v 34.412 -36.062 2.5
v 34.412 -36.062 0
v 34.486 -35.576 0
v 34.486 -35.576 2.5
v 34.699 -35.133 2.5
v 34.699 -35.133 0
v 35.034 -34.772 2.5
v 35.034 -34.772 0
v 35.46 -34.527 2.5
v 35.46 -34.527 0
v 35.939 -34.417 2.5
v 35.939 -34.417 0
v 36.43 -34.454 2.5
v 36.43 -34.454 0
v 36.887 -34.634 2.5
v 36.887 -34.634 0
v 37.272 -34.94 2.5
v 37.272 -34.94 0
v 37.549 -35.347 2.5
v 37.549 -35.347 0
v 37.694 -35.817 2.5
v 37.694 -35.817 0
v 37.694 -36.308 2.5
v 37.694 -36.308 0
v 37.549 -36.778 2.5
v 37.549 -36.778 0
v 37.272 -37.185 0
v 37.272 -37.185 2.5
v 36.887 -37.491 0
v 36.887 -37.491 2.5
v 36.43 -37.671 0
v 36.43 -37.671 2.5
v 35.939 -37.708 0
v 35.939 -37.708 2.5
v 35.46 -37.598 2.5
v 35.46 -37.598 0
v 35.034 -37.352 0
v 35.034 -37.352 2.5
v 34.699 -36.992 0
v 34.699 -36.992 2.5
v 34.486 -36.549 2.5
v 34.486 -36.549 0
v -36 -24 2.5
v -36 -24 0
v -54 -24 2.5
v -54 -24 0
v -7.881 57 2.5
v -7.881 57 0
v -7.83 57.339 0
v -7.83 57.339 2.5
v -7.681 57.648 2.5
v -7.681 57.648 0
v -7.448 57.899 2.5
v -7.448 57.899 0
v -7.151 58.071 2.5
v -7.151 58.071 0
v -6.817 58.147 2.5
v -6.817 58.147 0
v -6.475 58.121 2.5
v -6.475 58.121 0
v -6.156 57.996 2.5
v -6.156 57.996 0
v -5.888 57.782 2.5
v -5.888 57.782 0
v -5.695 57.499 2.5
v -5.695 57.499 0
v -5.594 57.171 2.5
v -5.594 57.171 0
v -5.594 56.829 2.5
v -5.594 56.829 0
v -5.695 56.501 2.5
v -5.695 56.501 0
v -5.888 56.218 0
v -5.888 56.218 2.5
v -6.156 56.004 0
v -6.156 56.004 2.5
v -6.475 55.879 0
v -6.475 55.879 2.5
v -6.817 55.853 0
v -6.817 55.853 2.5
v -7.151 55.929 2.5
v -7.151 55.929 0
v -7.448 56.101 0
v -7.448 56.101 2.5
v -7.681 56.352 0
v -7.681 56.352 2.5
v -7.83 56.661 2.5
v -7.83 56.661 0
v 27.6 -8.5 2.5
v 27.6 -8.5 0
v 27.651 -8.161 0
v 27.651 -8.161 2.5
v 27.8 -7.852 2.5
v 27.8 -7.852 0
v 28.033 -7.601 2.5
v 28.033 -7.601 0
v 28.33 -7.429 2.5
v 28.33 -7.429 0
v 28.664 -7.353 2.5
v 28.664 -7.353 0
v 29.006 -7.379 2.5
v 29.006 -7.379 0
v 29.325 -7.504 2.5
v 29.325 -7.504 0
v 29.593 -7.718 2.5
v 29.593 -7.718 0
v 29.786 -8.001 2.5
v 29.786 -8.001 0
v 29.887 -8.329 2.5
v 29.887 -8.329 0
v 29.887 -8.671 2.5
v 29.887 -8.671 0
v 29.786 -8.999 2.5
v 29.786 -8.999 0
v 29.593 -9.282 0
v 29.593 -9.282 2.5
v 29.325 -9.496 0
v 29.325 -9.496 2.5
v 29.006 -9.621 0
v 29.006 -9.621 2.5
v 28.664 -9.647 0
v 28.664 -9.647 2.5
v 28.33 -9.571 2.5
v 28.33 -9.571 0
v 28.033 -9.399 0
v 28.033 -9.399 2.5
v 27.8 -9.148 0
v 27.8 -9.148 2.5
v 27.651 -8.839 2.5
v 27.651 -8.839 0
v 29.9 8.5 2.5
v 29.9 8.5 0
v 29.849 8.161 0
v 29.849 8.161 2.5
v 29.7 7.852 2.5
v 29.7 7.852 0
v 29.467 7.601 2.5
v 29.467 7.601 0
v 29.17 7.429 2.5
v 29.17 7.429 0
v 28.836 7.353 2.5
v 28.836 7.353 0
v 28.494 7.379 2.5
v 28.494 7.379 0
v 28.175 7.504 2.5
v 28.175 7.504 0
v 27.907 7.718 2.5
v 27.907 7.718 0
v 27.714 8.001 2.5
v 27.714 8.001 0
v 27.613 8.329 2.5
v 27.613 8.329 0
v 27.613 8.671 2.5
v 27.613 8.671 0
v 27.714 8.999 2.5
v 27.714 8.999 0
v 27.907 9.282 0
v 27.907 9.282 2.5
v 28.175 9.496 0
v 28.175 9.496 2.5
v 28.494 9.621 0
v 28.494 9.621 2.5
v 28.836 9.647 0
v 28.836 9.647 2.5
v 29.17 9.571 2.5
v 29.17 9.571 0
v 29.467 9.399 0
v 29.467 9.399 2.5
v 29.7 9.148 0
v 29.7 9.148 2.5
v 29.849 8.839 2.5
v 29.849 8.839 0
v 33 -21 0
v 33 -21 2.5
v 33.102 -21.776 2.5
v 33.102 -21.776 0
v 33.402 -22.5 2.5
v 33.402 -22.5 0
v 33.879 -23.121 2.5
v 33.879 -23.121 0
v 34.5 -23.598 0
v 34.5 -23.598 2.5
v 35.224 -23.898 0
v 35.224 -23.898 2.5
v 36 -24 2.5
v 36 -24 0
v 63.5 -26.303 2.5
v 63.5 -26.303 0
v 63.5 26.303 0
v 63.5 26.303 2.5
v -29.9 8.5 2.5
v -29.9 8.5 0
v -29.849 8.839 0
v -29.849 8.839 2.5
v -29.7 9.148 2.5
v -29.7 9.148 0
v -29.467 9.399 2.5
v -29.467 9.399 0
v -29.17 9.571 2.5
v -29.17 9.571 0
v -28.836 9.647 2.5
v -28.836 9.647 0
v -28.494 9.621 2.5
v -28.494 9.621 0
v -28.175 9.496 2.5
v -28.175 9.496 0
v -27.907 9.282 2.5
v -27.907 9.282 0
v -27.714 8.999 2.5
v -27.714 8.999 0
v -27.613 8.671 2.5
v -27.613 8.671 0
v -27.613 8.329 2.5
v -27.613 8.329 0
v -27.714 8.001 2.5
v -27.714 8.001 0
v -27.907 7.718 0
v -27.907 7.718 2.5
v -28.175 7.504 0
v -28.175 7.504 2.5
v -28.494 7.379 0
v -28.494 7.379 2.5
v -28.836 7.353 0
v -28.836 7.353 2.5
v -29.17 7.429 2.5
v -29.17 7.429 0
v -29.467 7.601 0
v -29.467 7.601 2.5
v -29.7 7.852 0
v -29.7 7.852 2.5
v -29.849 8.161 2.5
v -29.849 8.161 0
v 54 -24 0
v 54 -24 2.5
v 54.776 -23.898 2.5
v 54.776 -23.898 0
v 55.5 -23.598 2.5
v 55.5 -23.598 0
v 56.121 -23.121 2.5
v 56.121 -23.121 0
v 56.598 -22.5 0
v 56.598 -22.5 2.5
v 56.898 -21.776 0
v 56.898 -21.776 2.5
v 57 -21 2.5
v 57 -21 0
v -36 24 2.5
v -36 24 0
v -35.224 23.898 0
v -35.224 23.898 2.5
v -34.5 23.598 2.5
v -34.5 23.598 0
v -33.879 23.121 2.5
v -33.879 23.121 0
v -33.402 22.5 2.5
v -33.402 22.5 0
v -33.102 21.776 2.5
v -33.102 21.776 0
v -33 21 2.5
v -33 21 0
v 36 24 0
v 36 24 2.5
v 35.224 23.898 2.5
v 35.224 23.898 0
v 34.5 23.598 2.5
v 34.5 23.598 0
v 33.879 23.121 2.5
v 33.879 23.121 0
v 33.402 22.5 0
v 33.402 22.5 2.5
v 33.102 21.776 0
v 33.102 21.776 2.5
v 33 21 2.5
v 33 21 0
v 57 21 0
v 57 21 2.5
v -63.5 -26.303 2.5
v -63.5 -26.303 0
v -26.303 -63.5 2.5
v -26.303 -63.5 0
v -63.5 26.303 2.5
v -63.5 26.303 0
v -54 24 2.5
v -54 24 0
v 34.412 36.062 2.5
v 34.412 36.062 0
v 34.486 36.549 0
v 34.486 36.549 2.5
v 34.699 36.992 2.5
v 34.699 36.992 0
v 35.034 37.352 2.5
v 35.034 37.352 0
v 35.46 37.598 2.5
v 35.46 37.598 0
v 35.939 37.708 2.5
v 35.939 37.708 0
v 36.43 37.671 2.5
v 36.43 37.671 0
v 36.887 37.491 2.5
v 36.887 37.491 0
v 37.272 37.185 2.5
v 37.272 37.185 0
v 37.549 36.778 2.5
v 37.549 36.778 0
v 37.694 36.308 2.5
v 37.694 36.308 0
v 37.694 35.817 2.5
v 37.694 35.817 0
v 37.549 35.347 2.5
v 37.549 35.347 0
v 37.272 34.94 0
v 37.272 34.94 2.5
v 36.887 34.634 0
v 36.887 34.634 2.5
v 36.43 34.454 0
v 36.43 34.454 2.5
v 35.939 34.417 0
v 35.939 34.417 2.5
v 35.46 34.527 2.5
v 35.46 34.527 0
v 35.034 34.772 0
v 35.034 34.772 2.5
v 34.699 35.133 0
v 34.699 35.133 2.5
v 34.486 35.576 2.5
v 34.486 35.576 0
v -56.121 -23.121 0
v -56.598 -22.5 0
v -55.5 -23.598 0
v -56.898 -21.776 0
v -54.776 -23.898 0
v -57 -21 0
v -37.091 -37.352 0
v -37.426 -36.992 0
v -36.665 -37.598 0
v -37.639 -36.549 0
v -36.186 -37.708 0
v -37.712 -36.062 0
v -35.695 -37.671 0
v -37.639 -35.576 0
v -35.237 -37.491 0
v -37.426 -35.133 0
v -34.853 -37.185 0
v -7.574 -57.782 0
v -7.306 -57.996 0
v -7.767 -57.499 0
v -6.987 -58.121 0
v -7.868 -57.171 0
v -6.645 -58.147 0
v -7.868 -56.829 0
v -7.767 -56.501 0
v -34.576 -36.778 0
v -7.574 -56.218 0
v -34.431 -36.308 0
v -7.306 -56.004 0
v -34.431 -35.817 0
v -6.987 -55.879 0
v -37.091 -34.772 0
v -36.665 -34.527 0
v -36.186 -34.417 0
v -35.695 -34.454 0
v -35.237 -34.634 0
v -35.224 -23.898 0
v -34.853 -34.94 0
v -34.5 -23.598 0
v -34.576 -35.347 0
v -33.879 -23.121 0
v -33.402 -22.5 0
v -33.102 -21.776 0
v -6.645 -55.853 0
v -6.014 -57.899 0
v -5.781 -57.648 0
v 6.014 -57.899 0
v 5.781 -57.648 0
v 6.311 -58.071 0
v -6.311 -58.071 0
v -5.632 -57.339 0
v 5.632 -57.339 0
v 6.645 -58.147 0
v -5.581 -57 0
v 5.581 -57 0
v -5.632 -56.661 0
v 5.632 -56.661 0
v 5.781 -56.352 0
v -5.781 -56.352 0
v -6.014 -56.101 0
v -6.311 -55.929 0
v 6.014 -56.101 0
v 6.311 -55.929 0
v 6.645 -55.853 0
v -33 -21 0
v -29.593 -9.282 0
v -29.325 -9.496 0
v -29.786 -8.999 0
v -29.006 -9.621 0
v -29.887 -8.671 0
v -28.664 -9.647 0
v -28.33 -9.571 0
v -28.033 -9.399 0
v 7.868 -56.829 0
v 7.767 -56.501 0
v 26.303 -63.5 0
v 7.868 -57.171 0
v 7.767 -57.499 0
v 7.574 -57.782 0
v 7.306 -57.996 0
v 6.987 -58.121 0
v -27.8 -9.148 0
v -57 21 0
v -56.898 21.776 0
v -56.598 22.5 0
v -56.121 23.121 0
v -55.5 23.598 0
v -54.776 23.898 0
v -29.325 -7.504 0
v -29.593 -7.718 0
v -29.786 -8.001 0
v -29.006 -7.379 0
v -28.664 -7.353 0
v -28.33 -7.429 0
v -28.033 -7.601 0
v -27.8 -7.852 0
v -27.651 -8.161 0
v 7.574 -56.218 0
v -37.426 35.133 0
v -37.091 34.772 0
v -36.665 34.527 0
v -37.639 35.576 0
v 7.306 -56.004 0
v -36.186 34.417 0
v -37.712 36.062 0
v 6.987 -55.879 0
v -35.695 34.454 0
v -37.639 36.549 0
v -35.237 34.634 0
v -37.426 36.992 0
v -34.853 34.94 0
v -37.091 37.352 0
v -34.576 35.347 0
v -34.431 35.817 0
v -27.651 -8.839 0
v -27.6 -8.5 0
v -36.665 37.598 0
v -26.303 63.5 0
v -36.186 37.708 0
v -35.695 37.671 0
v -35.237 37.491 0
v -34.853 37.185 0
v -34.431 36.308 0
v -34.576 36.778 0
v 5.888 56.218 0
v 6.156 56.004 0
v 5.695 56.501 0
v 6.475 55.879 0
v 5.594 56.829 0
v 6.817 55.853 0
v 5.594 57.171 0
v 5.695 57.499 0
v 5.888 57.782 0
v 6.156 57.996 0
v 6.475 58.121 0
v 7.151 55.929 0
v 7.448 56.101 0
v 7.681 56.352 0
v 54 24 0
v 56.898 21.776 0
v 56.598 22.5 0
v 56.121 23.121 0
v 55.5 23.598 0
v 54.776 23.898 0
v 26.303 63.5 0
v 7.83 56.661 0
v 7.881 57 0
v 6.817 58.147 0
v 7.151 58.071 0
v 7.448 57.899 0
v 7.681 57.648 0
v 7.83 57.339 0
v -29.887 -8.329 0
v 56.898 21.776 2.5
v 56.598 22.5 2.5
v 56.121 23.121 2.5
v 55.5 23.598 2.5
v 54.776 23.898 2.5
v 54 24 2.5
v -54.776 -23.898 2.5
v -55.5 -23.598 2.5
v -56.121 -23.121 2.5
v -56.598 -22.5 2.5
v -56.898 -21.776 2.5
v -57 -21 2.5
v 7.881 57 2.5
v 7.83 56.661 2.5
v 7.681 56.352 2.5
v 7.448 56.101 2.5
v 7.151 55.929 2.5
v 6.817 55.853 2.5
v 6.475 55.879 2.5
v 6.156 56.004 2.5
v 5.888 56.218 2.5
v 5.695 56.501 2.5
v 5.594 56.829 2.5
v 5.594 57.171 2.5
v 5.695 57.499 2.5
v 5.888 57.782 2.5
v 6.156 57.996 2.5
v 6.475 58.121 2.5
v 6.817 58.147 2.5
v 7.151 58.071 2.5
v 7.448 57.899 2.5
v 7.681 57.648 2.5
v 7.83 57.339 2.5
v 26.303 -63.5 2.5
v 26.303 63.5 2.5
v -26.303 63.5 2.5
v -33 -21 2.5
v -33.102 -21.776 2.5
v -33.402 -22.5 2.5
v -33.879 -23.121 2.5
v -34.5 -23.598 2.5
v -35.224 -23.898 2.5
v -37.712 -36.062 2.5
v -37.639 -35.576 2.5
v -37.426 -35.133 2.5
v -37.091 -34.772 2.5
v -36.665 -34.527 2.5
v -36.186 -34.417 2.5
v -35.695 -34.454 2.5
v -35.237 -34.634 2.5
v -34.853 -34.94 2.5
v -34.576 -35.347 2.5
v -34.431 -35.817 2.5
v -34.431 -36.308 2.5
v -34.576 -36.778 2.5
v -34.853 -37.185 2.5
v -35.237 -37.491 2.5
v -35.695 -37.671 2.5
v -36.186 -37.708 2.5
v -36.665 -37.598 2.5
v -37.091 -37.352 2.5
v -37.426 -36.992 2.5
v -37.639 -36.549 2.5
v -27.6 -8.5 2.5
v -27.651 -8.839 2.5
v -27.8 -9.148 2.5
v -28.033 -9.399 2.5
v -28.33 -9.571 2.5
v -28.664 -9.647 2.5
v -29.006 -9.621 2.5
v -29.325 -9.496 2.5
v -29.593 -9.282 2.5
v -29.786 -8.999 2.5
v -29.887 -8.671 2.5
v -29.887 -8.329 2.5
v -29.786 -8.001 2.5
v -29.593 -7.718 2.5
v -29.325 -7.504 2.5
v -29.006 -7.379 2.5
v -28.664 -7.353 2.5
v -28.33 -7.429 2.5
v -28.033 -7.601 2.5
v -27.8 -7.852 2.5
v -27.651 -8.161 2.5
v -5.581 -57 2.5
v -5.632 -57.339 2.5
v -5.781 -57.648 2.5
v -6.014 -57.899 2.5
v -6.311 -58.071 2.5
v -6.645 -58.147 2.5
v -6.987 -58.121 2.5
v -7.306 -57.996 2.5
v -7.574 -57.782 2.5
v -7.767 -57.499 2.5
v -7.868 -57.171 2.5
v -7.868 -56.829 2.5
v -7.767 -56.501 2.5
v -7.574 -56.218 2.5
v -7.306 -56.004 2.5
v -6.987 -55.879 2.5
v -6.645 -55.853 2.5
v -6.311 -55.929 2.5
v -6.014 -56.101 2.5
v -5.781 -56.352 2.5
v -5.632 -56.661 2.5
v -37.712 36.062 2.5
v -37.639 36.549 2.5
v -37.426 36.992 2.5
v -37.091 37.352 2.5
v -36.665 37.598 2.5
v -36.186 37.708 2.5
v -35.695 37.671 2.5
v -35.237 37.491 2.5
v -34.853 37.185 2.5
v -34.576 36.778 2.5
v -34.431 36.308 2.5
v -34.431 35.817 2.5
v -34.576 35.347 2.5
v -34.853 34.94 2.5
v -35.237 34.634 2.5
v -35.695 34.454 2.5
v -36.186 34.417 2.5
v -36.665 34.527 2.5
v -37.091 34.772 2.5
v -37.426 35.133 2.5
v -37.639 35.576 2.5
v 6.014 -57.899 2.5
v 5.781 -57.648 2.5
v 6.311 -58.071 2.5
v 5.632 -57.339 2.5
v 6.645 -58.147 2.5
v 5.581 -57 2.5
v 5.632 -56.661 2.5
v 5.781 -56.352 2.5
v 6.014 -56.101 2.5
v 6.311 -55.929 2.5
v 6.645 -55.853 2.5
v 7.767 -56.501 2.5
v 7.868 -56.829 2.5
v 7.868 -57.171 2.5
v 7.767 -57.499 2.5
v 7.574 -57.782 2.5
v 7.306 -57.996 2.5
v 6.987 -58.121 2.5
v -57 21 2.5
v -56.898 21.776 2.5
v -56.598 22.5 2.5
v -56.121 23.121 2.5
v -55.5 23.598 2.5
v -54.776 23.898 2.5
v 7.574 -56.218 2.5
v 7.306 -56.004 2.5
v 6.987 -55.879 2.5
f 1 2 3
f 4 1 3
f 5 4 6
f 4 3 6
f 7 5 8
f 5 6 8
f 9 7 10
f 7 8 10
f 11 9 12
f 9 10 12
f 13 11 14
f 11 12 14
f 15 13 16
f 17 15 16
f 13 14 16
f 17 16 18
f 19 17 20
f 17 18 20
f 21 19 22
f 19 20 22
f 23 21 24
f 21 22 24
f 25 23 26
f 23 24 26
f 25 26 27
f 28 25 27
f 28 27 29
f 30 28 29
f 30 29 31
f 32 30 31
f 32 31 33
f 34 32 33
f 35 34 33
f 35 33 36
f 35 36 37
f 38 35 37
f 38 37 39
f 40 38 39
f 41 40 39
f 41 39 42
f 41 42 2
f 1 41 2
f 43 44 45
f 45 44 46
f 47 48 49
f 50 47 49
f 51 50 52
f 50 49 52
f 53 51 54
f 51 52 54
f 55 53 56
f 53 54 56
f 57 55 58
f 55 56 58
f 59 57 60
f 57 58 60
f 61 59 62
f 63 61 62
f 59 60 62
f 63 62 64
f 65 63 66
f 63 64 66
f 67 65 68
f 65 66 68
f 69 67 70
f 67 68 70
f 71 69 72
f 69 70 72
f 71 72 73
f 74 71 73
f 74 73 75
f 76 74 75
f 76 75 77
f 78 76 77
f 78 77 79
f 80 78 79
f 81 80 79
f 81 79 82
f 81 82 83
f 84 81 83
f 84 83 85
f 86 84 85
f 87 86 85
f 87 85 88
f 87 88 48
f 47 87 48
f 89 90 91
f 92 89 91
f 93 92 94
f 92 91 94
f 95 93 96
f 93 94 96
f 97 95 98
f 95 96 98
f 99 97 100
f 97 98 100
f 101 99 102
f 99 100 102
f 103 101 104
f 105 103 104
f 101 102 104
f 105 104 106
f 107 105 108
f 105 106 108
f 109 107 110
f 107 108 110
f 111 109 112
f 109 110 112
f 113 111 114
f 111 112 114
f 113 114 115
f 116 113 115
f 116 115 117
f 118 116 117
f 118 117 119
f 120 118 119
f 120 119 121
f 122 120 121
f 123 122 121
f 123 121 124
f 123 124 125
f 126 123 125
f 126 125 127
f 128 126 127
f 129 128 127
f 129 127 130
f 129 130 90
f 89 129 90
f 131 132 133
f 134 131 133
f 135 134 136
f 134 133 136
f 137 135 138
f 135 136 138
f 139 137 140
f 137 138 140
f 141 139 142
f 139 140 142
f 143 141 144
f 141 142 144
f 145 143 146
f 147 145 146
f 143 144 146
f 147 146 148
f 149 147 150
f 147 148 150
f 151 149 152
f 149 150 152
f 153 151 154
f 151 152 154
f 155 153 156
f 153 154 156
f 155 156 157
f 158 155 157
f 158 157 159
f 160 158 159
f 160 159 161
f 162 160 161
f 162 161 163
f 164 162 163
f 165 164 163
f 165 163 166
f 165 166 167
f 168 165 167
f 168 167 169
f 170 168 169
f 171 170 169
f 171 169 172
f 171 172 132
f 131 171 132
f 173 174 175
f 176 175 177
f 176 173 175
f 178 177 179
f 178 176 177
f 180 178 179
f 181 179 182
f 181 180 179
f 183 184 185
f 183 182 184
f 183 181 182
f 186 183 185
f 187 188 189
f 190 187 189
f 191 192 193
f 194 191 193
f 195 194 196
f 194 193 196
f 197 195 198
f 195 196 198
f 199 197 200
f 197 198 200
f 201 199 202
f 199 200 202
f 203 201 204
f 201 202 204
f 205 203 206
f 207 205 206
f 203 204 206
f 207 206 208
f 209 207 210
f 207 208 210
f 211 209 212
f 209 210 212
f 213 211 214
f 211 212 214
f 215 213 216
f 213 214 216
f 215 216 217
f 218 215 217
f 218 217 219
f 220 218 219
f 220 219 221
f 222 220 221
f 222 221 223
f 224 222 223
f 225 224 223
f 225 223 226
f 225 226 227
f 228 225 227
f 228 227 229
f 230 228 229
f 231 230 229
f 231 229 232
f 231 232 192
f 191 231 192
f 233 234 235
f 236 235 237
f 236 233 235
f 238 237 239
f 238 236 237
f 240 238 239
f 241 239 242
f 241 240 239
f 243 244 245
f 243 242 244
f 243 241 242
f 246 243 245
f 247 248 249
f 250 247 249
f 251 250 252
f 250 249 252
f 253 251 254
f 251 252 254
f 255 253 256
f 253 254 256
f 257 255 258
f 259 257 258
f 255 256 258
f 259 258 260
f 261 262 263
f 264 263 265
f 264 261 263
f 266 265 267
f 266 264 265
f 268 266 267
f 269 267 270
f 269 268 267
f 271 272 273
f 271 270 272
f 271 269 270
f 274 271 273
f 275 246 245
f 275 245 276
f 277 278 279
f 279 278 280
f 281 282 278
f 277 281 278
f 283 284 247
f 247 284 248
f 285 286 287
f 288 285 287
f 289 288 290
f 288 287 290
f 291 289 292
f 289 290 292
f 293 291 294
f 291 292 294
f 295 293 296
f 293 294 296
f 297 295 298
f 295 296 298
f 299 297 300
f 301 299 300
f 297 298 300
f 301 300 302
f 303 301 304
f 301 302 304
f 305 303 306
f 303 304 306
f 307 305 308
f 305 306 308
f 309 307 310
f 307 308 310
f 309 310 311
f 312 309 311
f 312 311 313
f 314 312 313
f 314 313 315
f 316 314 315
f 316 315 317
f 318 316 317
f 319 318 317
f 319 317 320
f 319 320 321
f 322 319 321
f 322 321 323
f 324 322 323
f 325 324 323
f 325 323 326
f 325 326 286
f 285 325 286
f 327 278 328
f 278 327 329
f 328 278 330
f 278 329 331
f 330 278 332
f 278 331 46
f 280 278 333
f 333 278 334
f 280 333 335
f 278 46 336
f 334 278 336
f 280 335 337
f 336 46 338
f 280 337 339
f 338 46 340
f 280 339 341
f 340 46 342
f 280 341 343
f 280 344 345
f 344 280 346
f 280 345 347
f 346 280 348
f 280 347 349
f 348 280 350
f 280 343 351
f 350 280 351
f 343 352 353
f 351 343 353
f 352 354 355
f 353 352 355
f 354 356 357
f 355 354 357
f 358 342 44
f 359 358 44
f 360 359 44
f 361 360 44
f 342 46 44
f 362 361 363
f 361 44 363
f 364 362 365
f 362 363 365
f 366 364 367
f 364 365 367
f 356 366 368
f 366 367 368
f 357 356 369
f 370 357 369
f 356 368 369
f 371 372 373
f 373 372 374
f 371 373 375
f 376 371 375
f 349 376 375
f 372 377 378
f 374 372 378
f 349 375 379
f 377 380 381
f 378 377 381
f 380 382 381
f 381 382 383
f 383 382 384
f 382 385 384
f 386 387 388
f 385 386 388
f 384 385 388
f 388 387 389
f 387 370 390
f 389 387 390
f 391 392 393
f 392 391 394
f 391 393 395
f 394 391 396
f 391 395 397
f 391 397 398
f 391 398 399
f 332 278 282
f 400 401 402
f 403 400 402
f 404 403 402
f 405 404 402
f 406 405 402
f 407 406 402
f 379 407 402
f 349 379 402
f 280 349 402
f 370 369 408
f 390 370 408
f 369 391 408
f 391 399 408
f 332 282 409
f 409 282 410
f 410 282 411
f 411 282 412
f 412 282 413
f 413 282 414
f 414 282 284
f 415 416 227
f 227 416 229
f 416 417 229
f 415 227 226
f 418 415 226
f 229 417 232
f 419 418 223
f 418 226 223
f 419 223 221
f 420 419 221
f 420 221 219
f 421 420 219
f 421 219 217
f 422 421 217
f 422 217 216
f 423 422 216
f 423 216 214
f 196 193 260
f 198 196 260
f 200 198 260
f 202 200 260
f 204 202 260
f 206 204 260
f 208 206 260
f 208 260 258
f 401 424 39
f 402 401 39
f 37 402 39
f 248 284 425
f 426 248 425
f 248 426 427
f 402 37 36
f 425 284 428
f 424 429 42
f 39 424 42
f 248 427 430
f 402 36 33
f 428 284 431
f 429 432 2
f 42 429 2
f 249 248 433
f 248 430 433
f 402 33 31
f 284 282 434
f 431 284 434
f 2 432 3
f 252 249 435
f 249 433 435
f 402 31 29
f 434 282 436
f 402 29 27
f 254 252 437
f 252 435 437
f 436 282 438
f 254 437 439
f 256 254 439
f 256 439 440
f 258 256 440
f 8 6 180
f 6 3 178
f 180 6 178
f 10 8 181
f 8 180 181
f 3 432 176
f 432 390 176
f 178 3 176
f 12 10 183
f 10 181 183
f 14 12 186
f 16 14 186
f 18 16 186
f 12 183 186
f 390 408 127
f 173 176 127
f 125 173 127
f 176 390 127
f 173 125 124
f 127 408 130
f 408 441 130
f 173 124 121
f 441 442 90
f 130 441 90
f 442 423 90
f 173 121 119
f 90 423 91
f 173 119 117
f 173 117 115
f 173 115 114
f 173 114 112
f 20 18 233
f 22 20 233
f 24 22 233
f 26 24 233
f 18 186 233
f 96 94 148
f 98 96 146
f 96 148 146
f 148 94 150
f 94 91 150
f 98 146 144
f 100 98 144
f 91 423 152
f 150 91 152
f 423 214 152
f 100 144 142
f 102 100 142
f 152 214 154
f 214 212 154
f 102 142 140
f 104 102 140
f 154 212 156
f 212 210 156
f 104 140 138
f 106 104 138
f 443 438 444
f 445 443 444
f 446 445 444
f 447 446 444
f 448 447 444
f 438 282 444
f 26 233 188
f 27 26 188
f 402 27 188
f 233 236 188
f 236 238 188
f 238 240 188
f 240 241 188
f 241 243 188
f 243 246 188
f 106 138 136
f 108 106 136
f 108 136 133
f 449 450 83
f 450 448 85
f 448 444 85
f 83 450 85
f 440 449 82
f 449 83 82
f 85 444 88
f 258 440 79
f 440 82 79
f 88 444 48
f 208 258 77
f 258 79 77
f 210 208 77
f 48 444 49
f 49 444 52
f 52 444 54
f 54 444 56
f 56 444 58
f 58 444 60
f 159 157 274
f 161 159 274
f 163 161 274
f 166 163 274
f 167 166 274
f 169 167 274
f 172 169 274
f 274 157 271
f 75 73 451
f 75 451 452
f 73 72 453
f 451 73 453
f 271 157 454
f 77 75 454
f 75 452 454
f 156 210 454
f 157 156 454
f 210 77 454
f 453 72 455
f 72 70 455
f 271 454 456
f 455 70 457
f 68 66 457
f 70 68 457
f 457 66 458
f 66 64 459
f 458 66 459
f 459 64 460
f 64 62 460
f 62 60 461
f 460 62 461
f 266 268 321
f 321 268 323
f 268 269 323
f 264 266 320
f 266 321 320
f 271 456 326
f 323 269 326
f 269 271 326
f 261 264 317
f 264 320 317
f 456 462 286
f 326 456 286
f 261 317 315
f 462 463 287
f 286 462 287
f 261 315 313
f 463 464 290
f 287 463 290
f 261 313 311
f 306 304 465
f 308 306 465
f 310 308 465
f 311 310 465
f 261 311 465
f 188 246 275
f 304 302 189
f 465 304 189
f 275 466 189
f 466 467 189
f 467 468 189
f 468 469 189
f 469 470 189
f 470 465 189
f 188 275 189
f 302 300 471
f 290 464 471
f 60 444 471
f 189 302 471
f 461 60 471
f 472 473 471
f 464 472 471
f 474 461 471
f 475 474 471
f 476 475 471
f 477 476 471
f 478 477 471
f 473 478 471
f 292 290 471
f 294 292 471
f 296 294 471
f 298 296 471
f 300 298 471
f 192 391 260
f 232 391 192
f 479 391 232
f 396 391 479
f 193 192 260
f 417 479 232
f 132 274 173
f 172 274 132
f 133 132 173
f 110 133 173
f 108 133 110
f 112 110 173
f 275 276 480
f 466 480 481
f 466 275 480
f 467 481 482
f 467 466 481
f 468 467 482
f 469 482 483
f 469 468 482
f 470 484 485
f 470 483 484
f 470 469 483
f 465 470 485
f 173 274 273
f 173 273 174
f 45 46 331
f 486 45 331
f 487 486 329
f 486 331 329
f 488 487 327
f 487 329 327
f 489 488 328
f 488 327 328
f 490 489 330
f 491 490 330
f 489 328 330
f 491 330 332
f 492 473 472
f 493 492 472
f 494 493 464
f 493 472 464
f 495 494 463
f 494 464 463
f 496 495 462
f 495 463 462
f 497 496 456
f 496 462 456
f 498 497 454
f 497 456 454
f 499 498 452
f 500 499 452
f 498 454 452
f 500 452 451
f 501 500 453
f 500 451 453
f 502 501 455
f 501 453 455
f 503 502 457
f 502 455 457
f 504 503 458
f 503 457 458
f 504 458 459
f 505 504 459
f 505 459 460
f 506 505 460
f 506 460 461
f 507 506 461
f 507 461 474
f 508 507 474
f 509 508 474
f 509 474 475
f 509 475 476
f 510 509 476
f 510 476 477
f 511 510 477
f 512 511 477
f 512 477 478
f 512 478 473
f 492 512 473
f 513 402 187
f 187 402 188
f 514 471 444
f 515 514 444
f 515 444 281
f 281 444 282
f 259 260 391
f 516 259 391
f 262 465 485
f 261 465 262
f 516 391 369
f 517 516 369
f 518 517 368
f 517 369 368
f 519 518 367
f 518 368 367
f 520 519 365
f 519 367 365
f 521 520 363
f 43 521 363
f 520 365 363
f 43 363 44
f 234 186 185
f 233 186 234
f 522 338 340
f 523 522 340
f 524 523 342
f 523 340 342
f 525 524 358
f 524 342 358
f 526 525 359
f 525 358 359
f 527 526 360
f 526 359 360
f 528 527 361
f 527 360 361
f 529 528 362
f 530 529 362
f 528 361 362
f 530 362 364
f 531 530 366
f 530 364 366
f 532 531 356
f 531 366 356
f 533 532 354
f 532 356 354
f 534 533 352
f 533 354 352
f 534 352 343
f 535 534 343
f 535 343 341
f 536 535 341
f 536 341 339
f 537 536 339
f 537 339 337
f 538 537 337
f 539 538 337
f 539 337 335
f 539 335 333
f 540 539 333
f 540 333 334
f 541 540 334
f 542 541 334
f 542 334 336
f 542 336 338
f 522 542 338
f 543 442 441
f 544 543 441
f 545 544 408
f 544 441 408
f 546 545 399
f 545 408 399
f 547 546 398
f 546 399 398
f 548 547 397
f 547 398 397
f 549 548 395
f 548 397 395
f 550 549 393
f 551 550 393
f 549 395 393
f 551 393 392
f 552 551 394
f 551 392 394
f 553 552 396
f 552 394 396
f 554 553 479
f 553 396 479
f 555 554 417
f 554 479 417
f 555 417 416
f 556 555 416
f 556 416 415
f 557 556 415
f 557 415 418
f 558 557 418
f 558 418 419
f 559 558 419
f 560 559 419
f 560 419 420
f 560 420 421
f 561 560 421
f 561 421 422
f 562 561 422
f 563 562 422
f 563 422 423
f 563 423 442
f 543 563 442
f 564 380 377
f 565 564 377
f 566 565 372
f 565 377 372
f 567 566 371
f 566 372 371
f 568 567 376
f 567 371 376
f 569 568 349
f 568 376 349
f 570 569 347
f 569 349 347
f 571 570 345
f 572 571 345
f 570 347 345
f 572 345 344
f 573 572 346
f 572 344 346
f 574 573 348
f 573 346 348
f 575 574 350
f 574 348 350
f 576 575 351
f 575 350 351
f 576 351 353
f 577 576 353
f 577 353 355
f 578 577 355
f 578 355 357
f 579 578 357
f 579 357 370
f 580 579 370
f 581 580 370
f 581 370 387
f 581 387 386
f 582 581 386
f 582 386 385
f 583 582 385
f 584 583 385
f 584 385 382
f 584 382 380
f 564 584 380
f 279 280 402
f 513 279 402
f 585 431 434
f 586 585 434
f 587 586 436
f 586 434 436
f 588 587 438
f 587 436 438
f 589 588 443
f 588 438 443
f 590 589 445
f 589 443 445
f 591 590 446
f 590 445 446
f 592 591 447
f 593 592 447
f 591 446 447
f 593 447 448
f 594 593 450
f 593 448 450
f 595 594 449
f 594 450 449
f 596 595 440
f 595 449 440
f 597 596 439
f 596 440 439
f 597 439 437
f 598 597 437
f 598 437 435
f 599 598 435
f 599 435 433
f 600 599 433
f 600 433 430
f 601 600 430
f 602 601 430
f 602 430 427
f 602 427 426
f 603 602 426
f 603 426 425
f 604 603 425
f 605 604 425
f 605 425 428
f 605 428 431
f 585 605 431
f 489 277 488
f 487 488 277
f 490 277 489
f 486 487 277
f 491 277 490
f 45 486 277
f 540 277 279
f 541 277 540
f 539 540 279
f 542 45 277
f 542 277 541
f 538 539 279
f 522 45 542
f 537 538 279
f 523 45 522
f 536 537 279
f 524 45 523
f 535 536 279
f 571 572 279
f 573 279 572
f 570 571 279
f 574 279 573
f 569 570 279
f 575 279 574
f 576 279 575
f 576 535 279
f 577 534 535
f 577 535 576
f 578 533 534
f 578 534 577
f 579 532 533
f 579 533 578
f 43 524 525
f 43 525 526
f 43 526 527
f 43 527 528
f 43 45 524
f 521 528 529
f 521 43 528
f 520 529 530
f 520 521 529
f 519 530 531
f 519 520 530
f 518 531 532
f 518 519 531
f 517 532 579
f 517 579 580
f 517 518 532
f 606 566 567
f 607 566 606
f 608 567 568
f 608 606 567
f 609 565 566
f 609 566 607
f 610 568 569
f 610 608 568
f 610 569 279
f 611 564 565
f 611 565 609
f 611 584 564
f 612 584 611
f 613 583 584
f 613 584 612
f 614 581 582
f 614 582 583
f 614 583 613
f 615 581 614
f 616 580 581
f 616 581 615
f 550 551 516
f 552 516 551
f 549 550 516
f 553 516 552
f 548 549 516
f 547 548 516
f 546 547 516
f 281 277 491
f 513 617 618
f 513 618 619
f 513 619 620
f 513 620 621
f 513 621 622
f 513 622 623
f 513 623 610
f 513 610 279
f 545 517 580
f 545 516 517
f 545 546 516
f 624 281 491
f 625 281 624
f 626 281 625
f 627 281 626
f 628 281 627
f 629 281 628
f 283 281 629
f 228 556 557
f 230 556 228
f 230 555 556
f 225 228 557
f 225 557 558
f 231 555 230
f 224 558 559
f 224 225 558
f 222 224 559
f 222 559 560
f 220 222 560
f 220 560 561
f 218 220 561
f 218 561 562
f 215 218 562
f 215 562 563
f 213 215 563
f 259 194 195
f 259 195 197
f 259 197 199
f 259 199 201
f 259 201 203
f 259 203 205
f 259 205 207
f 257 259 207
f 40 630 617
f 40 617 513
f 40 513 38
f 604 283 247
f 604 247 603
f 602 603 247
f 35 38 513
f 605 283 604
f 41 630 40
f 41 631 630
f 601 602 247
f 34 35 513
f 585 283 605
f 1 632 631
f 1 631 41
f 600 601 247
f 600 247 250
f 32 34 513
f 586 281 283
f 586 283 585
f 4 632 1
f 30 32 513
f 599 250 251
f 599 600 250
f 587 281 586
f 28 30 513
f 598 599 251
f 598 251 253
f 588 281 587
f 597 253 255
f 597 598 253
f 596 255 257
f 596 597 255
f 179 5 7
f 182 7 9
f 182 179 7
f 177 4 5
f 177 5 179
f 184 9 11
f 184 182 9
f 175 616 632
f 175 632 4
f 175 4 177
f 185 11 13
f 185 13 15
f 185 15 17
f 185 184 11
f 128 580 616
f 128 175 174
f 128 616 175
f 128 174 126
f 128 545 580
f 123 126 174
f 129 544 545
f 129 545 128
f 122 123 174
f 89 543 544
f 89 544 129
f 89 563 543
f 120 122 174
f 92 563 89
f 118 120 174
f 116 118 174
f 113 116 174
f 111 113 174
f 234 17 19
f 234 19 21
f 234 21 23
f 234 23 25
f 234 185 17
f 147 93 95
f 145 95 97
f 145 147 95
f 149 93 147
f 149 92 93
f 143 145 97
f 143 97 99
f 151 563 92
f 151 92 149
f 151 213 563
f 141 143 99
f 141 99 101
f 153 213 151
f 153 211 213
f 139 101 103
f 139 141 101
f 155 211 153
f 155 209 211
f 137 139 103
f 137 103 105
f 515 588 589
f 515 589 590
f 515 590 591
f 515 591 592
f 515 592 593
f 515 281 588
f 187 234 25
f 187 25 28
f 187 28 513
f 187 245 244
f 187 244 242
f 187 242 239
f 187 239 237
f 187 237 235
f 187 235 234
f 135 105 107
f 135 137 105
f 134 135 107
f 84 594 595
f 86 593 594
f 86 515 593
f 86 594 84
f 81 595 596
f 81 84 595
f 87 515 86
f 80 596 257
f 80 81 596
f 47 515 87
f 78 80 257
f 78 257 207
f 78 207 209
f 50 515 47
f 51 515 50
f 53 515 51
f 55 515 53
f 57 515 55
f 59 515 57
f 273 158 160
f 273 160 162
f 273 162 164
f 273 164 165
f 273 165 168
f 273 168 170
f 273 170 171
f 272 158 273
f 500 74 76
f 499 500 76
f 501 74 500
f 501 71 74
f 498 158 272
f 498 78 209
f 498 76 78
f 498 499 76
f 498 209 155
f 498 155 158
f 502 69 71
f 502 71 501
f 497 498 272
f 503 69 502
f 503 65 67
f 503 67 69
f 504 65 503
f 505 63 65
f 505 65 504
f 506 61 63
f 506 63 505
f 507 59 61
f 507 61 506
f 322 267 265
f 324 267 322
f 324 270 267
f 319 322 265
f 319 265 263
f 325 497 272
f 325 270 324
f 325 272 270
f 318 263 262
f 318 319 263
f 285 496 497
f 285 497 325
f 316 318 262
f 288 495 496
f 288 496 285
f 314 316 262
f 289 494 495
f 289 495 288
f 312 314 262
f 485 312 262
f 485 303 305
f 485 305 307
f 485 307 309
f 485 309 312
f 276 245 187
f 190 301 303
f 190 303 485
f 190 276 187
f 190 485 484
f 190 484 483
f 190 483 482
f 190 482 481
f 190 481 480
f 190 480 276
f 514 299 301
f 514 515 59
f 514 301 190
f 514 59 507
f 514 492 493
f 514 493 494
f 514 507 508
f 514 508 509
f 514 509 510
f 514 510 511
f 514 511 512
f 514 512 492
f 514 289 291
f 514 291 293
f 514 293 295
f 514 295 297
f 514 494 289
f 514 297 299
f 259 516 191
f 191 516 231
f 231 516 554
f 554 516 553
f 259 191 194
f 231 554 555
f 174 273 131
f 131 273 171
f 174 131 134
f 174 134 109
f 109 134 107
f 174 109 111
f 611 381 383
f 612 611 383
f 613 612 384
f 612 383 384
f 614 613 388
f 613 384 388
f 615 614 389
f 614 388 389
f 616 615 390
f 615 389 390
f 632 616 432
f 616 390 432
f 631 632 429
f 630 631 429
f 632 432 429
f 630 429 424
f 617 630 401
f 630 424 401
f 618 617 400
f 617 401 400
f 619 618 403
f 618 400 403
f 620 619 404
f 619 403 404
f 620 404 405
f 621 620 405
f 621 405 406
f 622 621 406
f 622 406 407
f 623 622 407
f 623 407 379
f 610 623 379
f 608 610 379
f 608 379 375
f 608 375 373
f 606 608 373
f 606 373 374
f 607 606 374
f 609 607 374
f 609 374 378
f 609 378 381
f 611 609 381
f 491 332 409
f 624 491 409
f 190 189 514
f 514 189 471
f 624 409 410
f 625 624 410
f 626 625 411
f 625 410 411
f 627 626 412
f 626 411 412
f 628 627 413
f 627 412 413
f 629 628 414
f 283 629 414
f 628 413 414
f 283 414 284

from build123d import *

# Parameters (mm, degrees)
RESSALTO_EXTRUS_O1_DEPTH = 2.5
ESBO_O2_R                = 1.15
CORTE_EXTRUS_O1_DEPTH    = 90.837353033
ESBO_O4_R                = 1.65
CORTE_EXTRUS_O2_DEPTH    = 40.5


with BuildPart() as part:
    # Esboço1 → Ressalto-extrusão1 (new body)
    with BuildSketch(Plane.XY):
        Polygon((63.5, -26.302561211), (63.5, 26.302561211), (26.302561211, 63.5), (-26.302561211, 63.5), (-63.5, 26.302561211), (-63.5, -26.302561211), (-26.302561211, -63.5), (26.302561211, -63.5), align=None)
    extrude(amount=RESSALTO_EXTRUS_O1_DEPTH)

    # Esboço2 → Corte-extrusão1 (cut, through all)
    with BuildSketch(Plane(origin=(0, 0, 0), x_dir=(-1, 0, 0), z_dir=(0, 0, -1))):
        with Locations((28.75, 8.5)):
            Circle(ESBO_O2_R)
        with Locations(Location((28.75, -8.5, 0), (0, 0, 180))):
            Circle(ESBO_O2_R)
        with Locations((-28.75, -8.5)):
            Circle(ESBO_O2_R)
        with Locations(Location((-28.75, 8.5, 0), (0, 0, 180))):
            Circle(ESBO_O2_R)
        with Locations((-6.731, -57)):
            Circle(ESBO_O2_R)
        with Locations(Location((6.731, -57, 0), (0, 0, 180))):
            Circle(ESBO_O2_R)
        with Locations((6.731, 57)):
            Circle(ESBO_O2_R)
        with Locations(Location((-6.731, 57, 0), (0, 0, 180))):
            Circle(ESBO_O2_R)
        with BuildLine():
            Line((54, 24), (36, 24))
            ThreePointArc((36, 24), (33.878679656, 23.121320344), (33, 21))
            Line((33, 21), (33, -21))
            ThreePointArc((33, -21), (33.878679656, -23.121320344), (36, -24))
            Line((36, -24), (54, -24))
            ThreePointArc((54, -24), (56.121320344, -23.121320344), (57, -21))
            Line((57, -21), (57, 21))
            ThreePointArc((57, 21), (56.121320344, 23.121320344), (54, 24))
        make_face()
        with BuildLine():
            Line((-33, 21), (-33, -21))
            ThreePointArc((-33, -21), (-33.878679656, -23.121320344), (-36, -24))
            Line((-36, -24), (-54, -24))
            ThreePointArc((-54, -24), (-56.121320344, -23.121320344), (-57, -21))
            Line((-57, -21), (-57, 21))
            ThreePointArc((-57, 21), (-56.121320344, 23.121320344), (-54, 24))
            Line((-54, 24), (-36, 24))
            ThreePointArc((-36, 24), (-33.878679656, 23.121320344), (-33, 21))
        make_face()
    extrude(amount=-CORTE_EXTRUS_O1_DEPTH, mode=Mode.SUBTRACT)

    # Esboço4 → Corte-extrusão2 (cut)
    with BuildSketch(Plane(origin=(0, 0, 0), x_dir=(-1, 0, 0), z_dir=(0, 0, -1))):
        with Locations((36.062445841, -36.062445841)):
            Circle(ESBO_O4_R)
        with Locations((36.062445841, 36.062445841)):
            Circle(ESBO_O4_R)
        with Locations((-36.062445841, -36.062445841)):
            Circle(ESBO_O4_R)
        with Locations((-36.062445841, 36.062445841)):
            Circle(ESBO_O4_R)
    extrude(amount=-CORTE_EXTRUS_O2_DEPTH, mode=Mode.SUBTRACT)


solid = part.part
